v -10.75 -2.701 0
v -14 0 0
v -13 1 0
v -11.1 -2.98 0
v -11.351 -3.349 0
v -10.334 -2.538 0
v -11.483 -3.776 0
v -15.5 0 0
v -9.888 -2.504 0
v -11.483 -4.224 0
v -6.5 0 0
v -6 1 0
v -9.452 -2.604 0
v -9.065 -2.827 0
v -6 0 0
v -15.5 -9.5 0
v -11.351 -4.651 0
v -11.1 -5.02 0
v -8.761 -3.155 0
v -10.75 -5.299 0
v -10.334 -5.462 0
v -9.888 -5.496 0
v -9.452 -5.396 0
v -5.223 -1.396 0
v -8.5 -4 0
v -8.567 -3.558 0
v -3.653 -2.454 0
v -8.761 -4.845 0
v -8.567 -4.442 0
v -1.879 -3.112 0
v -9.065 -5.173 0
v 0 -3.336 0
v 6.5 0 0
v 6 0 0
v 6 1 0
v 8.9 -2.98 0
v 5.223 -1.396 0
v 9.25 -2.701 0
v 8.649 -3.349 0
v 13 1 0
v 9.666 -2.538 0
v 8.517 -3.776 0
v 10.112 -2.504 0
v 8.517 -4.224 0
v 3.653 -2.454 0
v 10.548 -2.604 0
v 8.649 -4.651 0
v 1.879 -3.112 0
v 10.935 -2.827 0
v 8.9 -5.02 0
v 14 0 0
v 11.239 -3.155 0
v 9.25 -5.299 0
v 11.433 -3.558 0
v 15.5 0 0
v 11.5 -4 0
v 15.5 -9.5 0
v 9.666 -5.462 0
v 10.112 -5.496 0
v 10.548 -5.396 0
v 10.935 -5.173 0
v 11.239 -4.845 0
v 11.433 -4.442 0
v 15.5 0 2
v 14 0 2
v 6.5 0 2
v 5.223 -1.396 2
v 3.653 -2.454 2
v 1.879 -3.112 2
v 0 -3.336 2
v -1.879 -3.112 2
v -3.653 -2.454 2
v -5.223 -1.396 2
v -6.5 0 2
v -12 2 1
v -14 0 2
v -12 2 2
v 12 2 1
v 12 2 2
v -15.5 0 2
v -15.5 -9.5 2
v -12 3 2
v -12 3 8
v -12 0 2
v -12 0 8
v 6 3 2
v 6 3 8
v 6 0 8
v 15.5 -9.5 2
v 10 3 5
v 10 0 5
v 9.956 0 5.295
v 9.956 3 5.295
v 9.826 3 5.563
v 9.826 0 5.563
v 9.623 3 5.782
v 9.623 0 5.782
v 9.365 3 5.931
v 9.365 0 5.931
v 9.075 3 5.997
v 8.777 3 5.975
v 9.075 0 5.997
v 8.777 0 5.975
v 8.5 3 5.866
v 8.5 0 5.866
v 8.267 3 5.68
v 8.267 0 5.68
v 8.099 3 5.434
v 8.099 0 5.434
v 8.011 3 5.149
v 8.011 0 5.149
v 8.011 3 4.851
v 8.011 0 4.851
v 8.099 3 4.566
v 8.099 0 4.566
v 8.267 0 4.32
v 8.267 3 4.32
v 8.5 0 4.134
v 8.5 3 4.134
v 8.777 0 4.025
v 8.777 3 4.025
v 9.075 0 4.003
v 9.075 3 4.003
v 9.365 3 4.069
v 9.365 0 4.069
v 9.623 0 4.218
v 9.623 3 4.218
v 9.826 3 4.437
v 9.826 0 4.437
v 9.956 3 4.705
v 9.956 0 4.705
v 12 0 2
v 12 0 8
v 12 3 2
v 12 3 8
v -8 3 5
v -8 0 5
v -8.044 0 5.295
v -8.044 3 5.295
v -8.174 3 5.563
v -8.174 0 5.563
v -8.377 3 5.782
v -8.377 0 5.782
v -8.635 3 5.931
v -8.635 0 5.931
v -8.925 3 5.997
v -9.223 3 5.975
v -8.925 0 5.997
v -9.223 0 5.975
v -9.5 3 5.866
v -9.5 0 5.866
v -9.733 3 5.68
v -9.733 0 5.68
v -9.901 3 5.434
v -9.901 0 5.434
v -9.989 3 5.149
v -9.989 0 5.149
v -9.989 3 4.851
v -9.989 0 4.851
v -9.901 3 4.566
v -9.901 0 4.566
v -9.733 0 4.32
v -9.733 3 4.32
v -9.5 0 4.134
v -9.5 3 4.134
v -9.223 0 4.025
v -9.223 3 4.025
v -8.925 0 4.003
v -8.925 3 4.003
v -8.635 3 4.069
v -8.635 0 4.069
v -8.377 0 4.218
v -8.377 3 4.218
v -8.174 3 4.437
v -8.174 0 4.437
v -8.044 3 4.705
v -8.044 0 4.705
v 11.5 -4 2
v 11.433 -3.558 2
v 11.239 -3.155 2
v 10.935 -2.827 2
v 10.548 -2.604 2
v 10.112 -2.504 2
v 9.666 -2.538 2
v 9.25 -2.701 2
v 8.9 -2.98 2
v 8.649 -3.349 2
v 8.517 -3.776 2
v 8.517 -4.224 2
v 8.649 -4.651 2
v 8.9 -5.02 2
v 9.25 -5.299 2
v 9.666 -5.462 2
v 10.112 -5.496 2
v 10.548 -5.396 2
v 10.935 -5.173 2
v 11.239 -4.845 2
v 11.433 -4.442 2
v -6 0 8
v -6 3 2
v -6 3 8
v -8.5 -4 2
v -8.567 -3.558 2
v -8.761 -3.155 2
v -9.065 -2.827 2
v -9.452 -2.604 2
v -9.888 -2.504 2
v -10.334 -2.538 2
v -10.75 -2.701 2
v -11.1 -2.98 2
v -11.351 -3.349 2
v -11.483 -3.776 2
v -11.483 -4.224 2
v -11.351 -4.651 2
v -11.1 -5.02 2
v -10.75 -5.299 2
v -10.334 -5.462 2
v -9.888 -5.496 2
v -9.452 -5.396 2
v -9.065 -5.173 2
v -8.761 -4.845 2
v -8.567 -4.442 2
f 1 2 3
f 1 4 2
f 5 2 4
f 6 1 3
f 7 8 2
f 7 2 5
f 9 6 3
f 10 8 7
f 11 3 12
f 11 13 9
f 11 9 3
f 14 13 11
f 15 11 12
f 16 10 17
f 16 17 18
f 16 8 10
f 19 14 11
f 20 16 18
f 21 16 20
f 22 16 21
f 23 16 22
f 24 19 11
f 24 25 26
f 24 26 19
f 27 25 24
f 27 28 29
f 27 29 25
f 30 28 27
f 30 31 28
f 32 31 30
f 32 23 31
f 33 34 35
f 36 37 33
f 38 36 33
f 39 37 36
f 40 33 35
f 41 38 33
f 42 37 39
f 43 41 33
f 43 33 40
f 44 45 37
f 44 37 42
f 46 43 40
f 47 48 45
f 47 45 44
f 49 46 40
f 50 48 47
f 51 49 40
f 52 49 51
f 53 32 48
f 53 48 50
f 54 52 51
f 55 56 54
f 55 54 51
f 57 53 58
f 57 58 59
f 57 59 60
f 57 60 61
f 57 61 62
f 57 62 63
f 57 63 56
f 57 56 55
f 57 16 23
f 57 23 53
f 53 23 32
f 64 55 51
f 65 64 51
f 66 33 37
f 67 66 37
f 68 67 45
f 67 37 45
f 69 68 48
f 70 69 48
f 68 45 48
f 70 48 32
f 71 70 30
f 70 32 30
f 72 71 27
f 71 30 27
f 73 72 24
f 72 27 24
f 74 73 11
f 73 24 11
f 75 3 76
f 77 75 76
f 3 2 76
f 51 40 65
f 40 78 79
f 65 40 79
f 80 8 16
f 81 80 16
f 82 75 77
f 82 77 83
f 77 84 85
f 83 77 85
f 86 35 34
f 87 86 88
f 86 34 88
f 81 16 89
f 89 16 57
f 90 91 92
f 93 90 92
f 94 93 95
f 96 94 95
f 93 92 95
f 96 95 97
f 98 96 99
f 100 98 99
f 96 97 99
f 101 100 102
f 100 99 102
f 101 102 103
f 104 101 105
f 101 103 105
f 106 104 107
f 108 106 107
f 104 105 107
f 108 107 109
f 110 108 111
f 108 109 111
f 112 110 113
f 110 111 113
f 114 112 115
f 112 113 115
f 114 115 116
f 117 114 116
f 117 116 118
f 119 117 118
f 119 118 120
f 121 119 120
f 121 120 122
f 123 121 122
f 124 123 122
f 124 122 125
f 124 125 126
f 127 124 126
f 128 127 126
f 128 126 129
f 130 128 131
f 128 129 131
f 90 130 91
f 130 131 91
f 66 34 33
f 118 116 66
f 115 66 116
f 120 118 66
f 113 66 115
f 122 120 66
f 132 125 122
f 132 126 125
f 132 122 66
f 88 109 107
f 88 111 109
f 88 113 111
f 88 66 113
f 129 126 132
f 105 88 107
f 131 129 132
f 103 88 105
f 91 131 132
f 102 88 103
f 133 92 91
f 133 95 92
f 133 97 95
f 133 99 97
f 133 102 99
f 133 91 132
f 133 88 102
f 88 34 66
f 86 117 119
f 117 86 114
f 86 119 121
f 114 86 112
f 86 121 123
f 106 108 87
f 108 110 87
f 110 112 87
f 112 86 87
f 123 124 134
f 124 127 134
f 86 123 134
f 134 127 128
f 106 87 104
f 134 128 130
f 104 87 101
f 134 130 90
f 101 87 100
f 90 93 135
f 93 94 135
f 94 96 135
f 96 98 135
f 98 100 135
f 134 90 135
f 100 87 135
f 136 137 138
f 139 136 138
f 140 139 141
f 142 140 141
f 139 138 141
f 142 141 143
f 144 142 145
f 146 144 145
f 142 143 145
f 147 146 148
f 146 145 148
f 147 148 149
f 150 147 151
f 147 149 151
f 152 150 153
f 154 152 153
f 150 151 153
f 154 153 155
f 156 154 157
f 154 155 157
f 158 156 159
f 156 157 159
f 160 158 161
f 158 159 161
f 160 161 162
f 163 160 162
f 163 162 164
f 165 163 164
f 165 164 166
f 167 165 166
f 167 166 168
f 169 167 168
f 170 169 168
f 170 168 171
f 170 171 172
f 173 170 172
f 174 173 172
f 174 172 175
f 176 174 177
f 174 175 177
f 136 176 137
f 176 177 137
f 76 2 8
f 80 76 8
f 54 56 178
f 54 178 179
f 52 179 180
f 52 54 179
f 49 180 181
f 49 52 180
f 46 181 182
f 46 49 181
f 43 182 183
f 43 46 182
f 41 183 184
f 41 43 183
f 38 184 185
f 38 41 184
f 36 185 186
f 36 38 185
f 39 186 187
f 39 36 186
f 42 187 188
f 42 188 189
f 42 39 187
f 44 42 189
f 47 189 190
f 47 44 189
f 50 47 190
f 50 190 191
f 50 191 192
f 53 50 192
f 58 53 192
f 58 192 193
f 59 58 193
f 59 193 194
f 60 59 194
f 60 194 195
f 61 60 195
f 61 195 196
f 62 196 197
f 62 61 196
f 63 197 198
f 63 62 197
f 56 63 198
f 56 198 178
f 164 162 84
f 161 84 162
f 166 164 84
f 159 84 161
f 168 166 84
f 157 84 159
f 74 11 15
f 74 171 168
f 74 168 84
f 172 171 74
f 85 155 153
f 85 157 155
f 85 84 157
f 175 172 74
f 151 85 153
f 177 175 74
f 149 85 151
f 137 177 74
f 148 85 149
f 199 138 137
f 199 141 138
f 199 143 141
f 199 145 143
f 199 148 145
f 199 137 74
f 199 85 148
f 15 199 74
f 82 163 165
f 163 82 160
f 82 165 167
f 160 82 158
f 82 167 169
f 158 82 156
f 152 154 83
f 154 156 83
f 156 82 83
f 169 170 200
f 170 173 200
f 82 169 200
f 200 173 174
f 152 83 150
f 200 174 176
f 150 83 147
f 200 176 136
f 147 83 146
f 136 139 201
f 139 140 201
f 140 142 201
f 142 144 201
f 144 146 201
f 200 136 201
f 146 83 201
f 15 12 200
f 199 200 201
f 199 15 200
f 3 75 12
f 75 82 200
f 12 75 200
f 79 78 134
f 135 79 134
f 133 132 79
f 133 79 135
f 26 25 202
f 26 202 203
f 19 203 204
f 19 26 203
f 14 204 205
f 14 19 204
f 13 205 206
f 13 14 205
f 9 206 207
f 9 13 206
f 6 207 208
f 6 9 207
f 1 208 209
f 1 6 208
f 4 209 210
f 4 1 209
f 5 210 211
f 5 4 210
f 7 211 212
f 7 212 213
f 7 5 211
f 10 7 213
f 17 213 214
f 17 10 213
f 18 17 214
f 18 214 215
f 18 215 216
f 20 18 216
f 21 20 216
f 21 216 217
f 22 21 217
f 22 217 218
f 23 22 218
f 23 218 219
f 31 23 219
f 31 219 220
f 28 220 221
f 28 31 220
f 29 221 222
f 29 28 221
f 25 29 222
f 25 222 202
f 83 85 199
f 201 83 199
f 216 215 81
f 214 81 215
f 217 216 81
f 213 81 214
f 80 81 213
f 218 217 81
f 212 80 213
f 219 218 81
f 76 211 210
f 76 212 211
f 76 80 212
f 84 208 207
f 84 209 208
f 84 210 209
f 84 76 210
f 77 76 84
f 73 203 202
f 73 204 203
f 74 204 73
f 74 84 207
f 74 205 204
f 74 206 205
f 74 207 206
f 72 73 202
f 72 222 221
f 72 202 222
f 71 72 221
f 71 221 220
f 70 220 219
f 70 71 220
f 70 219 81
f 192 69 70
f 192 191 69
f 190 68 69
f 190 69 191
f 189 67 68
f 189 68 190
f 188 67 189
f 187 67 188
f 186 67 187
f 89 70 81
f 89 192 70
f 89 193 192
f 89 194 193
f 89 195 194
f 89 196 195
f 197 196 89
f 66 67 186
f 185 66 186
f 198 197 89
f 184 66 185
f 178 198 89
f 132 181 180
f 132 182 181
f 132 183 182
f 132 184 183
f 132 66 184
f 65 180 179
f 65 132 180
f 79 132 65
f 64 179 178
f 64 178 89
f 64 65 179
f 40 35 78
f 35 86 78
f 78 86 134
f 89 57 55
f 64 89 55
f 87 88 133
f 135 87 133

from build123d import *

# Parameters (mm, degrees)
F0_R     = 1.5
F1_DEPTH = 2
F2_W     = 6
F2_H     = 8
F2_R     = 1
F3_DEPTH = 3
F4_SIZE  = 2
F5_SIZE  = 2


with BuildPart() as f1:
    # F0 (on Top) → F1 (new body)
    with BuildSketch(Plane.XY):
        with BuildLine():
            Line((-6.5, 0), (-15.5, 0))
            Line((-15.5, 0), (-15.5, -9.5))
            Line((-15.5, -9.5), (15.5, -9.5))
            Line((15.5, -9.5), (15.5, 0))
            Line((15.5, 0), (6.5, 0))
            ThreePointArc((6.5, 0), (0, -3.3363104735), (-6.5, 0))
        make_face()
        with Locations((-10, -4)):
            Circle(F0_R, mode=Mode.SUBTRACT)
        with Locations((10, -4)):
            Circle(F0_R, mode=Mode.SUBTRACT)
    extrude(amount=F1_DEPTH)

    # F2 (on Front) → F3 (join)
    with BuildSketch(Plane.XZ):
        with Locations((-9, 4)):
            Rectangle(F2_W, F2_H)
        with Locations((-9, 5)):
            Circle(F2_R, mode=Mode.SUBTRACT)
        with Locations((9, 4)):
            Rectangle(F2_W, F2_H)
        with Locations((9, 5)):
            Circle(F2_R, mode=Mode.SUBTRACT)
    extrude(amount=-F3_DEPTH)

    # F4
    f4_edges = [f1.edges().sort_by_distance(p)[0] for p in [
        (9, 3, 0),
        (-9, 3, 0),
    ]]
    chamfer(f4_edges, length=F4_SIZE)

    # F5
    f5_edges = [f1.edges().sort_by_distance(p)[0] for p in [
        (-12, 0, 1),
        (12, 0, 1),
    ]]
    chamfer(f5_edges, length=F5_SIZE)


solid = f1.part
